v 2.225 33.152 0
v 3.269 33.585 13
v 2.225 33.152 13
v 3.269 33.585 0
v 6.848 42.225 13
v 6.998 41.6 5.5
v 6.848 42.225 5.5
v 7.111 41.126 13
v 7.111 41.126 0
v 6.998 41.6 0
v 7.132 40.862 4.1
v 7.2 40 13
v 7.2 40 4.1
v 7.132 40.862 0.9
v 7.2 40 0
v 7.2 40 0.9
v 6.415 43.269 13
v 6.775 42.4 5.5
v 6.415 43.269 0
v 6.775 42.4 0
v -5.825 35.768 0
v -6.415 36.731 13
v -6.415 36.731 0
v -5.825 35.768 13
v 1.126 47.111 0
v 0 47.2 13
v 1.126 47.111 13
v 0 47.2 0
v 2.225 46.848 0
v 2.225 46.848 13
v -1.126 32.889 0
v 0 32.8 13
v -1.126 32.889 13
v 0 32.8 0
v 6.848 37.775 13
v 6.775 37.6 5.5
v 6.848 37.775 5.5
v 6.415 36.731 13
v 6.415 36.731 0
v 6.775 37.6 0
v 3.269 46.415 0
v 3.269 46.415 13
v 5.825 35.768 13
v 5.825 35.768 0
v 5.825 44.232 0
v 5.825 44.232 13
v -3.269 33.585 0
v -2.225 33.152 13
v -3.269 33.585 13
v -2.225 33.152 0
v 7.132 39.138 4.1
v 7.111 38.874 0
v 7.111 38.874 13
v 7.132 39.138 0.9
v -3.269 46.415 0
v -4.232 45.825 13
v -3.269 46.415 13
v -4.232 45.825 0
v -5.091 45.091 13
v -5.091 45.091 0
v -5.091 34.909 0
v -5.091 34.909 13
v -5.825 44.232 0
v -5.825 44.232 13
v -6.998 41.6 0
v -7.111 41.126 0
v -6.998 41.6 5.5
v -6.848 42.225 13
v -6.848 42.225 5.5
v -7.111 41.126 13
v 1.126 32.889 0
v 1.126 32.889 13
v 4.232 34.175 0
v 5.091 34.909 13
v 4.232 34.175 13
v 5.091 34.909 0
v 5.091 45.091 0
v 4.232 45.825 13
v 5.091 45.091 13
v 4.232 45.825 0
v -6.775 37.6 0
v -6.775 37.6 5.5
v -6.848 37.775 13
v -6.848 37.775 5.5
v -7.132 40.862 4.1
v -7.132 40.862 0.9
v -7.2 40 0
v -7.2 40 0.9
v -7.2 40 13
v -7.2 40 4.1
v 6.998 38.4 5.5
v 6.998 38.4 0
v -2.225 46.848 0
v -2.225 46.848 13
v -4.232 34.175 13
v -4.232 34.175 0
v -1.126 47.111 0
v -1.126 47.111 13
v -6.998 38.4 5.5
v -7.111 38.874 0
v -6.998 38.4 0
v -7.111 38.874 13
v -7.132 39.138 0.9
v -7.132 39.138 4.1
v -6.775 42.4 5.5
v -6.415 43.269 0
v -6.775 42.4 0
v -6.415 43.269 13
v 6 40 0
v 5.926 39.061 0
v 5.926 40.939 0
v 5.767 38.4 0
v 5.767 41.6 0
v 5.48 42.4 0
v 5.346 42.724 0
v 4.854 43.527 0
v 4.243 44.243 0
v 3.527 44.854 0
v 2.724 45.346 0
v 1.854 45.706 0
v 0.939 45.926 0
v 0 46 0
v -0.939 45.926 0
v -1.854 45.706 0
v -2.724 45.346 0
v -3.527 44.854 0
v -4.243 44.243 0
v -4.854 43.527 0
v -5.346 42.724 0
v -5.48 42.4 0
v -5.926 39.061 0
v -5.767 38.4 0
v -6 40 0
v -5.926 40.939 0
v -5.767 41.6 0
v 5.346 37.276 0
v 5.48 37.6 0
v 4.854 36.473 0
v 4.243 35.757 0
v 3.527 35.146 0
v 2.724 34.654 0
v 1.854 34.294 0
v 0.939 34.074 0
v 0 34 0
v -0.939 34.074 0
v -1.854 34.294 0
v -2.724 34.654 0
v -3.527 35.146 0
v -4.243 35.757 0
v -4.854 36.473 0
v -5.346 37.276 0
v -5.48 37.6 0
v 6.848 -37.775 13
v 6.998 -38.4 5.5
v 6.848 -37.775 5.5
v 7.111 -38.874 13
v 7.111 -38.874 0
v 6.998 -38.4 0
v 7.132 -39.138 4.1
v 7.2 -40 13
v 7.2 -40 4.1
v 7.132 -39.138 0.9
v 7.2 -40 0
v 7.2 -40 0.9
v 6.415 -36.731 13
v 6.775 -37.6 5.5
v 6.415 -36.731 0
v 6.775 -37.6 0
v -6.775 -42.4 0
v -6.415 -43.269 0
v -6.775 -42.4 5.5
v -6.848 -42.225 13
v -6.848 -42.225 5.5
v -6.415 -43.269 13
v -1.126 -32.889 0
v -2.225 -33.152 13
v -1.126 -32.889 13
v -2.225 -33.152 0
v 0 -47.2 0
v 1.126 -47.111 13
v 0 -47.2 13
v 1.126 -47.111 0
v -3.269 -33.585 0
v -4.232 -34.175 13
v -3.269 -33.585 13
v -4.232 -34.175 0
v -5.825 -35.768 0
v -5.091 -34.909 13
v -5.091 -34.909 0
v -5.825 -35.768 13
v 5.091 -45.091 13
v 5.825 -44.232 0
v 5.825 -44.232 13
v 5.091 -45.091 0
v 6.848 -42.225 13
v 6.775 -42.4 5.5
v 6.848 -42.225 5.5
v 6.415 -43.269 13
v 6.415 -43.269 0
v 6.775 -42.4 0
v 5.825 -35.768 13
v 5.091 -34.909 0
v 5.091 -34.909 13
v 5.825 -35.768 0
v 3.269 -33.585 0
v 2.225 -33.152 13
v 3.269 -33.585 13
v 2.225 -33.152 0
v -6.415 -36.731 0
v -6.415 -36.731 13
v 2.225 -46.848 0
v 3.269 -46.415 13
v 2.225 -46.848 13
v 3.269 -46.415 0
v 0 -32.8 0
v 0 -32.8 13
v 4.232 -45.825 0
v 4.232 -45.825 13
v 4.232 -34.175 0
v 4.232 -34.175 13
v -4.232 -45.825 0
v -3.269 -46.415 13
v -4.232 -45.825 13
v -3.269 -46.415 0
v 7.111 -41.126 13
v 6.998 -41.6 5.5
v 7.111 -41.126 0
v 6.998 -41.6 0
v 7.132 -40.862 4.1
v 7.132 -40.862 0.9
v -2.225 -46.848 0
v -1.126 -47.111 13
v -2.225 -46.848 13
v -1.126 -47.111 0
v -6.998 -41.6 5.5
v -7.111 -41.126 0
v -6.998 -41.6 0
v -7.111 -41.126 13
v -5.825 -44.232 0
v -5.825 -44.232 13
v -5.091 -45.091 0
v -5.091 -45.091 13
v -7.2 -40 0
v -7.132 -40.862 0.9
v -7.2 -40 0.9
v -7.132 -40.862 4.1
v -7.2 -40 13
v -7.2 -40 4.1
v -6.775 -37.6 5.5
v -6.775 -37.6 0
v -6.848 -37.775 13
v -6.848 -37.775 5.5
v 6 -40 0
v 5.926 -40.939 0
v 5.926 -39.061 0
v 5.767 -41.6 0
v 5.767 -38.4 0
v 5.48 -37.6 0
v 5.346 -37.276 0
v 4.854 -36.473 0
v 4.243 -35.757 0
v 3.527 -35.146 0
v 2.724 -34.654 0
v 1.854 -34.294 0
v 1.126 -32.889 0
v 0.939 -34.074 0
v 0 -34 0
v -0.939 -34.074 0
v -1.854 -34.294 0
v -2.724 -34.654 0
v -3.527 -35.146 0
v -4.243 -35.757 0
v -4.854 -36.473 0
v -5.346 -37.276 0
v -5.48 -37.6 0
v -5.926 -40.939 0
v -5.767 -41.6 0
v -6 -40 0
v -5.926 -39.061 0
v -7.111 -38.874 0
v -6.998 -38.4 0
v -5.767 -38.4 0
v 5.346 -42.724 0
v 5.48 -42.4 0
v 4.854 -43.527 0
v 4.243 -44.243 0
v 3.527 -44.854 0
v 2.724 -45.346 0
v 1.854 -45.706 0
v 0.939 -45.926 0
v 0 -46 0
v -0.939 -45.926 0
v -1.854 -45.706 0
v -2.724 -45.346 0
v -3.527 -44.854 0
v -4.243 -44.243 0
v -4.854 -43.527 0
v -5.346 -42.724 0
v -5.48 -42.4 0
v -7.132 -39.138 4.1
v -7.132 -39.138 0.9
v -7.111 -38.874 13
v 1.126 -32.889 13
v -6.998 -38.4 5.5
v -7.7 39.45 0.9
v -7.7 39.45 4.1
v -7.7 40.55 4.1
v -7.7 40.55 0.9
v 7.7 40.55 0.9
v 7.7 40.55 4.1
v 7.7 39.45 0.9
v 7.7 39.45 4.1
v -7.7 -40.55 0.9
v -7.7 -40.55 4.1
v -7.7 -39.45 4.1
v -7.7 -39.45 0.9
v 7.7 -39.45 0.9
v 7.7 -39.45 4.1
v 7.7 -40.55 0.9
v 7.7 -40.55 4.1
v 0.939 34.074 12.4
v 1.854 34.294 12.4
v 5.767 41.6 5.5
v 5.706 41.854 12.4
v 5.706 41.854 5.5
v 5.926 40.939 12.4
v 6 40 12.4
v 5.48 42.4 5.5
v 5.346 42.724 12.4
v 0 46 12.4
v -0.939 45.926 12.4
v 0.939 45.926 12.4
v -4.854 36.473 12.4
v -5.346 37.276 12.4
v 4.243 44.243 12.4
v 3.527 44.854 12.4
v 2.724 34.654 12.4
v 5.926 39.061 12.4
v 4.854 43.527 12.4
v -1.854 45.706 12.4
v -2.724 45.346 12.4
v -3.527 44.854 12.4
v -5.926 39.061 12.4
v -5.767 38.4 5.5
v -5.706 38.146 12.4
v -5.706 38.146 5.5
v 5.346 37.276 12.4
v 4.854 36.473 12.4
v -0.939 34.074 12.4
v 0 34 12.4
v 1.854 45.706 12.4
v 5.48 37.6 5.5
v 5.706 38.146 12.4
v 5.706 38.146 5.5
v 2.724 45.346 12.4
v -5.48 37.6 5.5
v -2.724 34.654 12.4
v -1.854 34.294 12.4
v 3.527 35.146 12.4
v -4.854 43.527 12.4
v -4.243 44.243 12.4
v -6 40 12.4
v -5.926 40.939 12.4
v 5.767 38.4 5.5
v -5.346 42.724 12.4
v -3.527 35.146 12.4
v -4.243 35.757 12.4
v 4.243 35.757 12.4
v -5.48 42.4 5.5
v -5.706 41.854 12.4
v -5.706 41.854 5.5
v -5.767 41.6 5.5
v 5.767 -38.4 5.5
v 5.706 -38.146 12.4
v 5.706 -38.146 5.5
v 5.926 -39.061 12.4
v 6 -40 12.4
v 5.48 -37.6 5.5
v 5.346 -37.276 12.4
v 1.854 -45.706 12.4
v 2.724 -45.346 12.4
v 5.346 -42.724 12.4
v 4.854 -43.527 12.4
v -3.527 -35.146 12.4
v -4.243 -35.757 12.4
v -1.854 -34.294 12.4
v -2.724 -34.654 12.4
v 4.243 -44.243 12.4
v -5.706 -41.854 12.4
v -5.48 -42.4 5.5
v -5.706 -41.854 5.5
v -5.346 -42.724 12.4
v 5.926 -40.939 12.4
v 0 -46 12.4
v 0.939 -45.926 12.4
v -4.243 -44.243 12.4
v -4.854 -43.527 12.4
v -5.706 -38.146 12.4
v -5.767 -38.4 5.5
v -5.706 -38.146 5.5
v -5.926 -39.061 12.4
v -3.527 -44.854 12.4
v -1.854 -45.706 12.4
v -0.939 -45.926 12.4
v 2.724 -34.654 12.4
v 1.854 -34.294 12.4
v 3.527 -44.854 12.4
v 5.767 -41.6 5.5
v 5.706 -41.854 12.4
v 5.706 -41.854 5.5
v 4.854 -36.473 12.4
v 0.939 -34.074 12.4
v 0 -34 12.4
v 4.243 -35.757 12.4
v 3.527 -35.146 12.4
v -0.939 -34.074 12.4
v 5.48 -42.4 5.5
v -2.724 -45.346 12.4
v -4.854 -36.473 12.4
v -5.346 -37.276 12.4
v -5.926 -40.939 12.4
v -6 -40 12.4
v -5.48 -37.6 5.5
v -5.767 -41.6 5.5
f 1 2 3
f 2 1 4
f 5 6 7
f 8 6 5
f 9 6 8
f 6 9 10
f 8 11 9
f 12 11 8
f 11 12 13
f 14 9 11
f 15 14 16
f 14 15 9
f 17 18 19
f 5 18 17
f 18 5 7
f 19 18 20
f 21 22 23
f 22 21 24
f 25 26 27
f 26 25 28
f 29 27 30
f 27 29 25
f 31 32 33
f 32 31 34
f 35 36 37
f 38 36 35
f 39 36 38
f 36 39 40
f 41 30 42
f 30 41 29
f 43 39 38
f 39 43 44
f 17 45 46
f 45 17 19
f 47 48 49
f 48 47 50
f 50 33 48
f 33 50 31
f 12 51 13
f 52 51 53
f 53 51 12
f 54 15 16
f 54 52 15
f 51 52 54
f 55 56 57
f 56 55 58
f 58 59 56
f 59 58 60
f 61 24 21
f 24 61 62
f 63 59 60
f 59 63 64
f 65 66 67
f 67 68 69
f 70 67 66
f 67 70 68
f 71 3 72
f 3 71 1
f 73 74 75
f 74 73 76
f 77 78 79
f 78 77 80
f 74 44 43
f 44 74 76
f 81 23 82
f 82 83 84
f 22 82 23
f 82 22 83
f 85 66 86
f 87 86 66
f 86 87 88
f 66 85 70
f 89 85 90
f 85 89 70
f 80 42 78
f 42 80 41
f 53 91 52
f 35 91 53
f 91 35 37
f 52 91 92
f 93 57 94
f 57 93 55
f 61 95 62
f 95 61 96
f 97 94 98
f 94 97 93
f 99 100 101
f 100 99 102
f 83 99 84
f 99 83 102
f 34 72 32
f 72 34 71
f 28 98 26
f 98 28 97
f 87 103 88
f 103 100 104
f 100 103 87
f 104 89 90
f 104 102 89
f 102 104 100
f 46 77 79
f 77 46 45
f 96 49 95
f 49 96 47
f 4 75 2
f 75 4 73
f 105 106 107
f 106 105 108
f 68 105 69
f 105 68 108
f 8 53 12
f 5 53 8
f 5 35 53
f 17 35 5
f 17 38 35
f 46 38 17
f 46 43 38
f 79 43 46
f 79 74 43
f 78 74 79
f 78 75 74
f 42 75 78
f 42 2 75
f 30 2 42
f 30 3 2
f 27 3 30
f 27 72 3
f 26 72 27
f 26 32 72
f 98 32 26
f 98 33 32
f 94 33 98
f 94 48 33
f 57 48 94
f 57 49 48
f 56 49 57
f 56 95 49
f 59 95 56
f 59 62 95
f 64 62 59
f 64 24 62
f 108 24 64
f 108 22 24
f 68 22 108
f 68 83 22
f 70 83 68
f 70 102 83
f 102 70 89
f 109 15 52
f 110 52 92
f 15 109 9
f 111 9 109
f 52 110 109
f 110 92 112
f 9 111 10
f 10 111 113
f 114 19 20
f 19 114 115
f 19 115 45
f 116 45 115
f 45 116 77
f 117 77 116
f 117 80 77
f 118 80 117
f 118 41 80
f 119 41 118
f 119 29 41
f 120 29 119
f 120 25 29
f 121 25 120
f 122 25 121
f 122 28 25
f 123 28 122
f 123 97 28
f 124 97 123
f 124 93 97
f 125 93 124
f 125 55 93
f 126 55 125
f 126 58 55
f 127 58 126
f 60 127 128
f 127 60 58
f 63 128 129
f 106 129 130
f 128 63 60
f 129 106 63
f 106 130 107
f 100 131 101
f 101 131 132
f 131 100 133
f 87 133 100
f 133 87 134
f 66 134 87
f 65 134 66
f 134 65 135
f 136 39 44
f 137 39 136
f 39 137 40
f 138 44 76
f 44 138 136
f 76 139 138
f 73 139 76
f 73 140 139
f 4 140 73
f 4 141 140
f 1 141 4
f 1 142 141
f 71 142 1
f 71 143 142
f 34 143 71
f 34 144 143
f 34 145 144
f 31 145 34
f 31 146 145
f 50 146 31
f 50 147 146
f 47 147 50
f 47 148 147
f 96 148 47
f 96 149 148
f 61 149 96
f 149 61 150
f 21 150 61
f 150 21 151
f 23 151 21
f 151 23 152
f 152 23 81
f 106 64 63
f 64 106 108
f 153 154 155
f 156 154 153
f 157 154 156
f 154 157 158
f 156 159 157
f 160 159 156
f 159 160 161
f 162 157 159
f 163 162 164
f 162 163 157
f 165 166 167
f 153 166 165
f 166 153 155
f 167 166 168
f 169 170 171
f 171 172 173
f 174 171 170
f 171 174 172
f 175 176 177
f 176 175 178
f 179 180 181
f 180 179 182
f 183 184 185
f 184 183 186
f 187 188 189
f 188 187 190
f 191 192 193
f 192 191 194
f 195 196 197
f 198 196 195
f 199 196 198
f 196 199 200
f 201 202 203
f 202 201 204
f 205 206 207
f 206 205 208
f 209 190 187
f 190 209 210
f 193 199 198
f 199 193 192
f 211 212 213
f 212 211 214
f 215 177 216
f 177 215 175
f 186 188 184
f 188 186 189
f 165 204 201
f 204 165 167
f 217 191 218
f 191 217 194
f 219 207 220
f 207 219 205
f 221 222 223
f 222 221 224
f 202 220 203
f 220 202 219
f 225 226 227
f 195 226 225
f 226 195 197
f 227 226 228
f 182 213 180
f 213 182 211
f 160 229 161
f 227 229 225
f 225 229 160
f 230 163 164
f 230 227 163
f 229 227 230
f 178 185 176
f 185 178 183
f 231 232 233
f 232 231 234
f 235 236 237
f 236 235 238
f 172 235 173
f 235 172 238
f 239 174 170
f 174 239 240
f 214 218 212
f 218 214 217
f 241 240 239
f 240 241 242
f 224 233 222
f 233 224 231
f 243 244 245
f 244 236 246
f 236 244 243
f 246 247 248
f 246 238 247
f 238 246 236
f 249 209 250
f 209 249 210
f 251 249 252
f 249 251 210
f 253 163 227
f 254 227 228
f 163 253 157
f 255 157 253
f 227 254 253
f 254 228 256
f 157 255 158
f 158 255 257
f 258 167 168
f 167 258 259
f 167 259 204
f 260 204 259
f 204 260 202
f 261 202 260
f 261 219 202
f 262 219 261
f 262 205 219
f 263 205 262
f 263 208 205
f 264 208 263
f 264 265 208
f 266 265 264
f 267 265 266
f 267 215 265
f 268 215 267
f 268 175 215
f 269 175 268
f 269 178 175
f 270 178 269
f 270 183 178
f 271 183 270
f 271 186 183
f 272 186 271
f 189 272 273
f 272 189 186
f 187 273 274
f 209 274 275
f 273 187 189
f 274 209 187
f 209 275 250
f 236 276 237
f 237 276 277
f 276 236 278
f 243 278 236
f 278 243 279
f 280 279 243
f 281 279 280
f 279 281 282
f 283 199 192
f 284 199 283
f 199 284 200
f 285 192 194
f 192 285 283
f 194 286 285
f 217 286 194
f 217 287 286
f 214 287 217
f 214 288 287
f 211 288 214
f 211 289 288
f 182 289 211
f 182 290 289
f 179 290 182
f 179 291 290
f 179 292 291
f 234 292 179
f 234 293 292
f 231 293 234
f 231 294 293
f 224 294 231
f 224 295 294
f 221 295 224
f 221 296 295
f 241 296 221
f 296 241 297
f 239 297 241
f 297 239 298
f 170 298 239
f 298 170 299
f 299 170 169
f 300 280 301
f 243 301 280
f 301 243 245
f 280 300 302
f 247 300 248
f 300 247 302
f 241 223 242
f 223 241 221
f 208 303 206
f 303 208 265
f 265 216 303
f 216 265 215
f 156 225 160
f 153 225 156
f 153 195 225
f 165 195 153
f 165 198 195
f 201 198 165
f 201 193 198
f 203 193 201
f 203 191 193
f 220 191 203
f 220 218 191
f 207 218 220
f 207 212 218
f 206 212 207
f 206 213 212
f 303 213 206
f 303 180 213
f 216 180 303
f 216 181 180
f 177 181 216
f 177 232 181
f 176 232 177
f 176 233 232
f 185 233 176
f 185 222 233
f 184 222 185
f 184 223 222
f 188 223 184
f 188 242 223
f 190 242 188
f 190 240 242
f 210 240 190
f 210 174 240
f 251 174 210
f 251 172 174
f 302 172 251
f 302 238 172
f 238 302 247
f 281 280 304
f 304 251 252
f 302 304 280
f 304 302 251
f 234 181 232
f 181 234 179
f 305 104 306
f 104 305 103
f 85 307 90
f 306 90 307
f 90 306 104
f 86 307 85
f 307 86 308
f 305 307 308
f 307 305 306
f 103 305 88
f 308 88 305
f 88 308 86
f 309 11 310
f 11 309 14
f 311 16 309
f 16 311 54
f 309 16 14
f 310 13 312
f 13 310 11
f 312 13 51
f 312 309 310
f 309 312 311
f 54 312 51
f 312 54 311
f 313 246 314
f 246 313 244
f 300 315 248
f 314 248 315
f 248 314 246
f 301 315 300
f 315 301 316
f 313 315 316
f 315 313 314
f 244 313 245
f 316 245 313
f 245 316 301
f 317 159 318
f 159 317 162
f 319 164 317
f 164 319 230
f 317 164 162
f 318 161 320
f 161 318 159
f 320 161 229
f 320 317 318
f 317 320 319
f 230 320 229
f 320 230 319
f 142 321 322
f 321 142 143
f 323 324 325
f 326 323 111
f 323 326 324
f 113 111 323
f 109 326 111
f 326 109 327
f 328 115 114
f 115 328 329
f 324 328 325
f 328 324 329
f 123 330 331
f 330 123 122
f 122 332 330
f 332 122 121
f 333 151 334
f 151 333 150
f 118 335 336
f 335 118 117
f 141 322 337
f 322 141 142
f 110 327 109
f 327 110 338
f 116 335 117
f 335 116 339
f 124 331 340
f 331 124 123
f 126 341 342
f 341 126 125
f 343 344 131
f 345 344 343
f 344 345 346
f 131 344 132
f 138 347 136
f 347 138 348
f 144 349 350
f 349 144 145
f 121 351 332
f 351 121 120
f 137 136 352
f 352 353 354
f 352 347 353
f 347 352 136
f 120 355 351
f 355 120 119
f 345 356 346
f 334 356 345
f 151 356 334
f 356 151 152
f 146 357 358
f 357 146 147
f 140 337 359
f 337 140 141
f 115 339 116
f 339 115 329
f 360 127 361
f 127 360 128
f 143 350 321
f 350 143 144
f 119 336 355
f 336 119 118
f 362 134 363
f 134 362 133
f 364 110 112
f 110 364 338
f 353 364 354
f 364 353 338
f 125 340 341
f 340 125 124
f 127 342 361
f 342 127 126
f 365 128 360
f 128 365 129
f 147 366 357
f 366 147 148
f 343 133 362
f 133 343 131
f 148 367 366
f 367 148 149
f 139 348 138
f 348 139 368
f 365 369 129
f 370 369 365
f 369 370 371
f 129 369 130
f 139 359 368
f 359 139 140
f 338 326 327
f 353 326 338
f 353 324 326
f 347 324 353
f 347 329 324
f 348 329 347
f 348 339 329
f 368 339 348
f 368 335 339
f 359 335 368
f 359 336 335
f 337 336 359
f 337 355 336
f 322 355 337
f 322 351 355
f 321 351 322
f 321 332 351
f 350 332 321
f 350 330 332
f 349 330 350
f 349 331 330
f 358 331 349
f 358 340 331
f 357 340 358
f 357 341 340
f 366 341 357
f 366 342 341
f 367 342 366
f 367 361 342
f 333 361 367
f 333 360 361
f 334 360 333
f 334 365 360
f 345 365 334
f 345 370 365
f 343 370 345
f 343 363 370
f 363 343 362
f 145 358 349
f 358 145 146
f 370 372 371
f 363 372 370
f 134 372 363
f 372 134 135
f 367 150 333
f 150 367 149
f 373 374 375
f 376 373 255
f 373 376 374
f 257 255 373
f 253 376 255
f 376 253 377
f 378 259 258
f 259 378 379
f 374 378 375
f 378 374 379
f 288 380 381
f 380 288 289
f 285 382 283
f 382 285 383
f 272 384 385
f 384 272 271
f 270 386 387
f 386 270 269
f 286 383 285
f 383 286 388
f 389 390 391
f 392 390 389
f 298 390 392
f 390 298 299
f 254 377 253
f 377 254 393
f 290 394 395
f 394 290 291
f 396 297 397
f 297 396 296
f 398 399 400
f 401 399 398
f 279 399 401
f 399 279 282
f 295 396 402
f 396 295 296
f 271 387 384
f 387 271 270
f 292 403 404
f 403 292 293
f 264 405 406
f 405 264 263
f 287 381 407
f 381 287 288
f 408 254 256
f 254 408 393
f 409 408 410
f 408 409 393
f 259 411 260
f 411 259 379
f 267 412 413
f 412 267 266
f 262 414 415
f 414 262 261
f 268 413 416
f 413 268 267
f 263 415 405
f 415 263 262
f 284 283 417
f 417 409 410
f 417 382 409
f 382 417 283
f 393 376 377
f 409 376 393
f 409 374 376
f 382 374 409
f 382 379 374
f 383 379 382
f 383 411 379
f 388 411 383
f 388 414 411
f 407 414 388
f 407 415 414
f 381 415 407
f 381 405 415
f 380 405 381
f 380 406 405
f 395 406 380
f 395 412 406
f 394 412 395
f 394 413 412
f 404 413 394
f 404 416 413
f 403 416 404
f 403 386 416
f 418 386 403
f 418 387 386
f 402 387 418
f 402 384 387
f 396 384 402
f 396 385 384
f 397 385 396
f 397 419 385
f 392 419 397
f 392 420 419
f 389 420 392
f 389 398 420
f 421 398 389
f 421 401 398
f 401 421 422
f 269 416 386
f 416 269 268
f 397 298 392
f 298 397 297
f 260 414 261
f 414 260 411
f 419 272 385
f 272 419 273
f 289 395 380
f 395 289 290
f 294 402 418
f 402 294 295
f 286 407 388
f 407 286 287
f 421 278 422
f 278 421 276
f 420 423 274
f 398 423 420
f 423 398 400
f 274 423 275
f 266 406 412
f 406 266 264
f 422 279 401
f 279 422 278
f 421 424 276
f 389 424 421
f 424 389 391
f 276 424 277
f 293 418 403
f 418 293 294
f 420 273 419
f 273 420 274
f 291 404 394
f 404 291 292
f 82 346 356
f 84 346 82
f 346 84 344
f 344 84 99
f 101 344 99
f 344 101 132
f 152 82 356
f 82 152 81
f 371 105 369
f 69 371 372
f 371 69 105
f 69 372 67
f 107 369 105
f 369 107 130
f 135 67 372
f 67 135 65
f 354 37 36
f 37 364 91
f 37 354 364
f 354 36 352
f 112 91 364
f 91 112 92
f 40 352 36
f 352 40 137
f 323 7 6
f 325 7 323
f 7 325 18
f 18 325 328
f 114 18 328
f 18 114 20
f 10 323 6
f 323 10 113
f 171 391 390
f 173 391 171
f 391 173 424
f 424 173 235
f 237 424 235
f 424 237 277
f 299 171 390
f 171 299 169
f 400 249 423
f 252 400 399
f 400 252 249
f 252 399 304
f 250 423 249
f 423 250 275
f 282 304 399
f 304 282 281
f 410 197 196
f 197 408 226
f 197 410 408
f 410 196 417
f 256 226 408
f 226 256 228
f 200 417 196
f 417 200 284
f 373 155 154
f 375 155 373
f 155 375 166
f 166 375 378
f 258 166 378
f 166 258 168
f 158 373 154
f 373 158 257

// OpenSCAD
// Colon Dots Lightguide / Diffuser (Parametric)
// Solid continuous reflector walls (No wire cutouts)
// Optimized for maximum brightness: 0.6mm and 0.8mm top diffuser layer variants

// --- Configuration Parameter ---
diffuser_thick = 0.6; // [0.6: High Brightness (0.6mm), 0.8: Balanced (0.8mm), 1.0: Standard (1.0mm)]

total_depth = 13.0;   // Matches frontplate housing depth (13.0 mm)
tunnel_depth = total_depth - diffuser_thick; // Inner cavity depth (12.4mm for 0.6, 12.2mm for 0.8)

// --- Colon Dimensions (matching colon_pogo.scad) ---
colon_y_offset = 40.0;
colon_radius = 6.0;
white_wall = 1.2;
enable_lightguide_snap_locks = true;

// Snap-lock detents & tabs geometry
module colon_lightguide_snap_teeth(is_subtraction = false) {
    if (enable_lightguide_snap_locks) {
        tooth_w = 3.2;
        tooth_h = 2.2;
        tooth_reach = is_subtraction ? 0.7 : 0.5;
        
        for (y = [colon_y_offset, -colon_y_offset]) {
            for (side = [-1, 1]) {
                translate([side * (colon_radius + white_wall), y, 2.5]) {
                    if (is_subtraction) {
                        cube([tooth_reach * 2 + 0.4, tooth_w + 0.4, tooth_h + 0.4], center=true);
                    } else {
                        // Sunk 0.5mm into cylinder wall to guarantee 100% clean manifold union
                        rotate([0, side > 0 ? 0 : 180, 0])
                            linear_extrude(tooth_w, center=true)
                                polygon([
                                    [-0.5, -tooth_h/2],
                                    [tooth_reach, -tooth_h/4],
                                    [tooth_reach, tooth_h/4],
                                    [-0.5, tooth_h/2]
                                ]);
                    }
                }
            }
        }
    }
}

module colon_lightguide_flex_slits() {
    if (enable_lightguide_snap_locks) {
        slit_w = 0.8;
        slit_l = 4.0;
        slit_h = 5.5;
        for (y = [colon_y_offset, -colon_y_offset]) {
            for (side = [-1, 1]) {
                for (dy = [-2.0, 2.0]) {
                    translate([side * (colon_radius + white_wall), y + dy, slit_h/2 - 0.1])
                        cube([slit_l, slit_w, slit_h + 0.2], center=true);
                }
            }
        }
    }
}

module colon_frontplate_white(d_thick = diffuser_thick) {
    t_depth = total_depth - d_thick;
    difference() {
        union() {
            // Outer white reflector walls + top diffuser (Total depth = 13.0 mm)
            for (y = [colon_y_offset, -colon_y_offset]) {
                translate([0, y, 0]) cylinder(h=total_depth, r=colon_radius + white_wall, $fn=40);
            }
            
            // Outward snap-lock teeth on lightguide sides (cleanly embedded)
            colon_lightguide_snap_teeth(is_subtraction = false);
        }
        
        // Hollow light tunnel cavity, leaving d_thick solid diffuser face on top
        for (y = [colon_y_offset, -colon_y_offset]) {
            translate([0, y, -0.1]) cylinder(h=t_depth + 0.1, r=colon_radius, $fn=40);
        }
        
        // Compliance flex slits allowing snap teeth to deflect on insertion
        colon_lightguide_flex_slits();
    }
}

// Default render
color("White") colon_frontplate_white(diffuser_thick);
